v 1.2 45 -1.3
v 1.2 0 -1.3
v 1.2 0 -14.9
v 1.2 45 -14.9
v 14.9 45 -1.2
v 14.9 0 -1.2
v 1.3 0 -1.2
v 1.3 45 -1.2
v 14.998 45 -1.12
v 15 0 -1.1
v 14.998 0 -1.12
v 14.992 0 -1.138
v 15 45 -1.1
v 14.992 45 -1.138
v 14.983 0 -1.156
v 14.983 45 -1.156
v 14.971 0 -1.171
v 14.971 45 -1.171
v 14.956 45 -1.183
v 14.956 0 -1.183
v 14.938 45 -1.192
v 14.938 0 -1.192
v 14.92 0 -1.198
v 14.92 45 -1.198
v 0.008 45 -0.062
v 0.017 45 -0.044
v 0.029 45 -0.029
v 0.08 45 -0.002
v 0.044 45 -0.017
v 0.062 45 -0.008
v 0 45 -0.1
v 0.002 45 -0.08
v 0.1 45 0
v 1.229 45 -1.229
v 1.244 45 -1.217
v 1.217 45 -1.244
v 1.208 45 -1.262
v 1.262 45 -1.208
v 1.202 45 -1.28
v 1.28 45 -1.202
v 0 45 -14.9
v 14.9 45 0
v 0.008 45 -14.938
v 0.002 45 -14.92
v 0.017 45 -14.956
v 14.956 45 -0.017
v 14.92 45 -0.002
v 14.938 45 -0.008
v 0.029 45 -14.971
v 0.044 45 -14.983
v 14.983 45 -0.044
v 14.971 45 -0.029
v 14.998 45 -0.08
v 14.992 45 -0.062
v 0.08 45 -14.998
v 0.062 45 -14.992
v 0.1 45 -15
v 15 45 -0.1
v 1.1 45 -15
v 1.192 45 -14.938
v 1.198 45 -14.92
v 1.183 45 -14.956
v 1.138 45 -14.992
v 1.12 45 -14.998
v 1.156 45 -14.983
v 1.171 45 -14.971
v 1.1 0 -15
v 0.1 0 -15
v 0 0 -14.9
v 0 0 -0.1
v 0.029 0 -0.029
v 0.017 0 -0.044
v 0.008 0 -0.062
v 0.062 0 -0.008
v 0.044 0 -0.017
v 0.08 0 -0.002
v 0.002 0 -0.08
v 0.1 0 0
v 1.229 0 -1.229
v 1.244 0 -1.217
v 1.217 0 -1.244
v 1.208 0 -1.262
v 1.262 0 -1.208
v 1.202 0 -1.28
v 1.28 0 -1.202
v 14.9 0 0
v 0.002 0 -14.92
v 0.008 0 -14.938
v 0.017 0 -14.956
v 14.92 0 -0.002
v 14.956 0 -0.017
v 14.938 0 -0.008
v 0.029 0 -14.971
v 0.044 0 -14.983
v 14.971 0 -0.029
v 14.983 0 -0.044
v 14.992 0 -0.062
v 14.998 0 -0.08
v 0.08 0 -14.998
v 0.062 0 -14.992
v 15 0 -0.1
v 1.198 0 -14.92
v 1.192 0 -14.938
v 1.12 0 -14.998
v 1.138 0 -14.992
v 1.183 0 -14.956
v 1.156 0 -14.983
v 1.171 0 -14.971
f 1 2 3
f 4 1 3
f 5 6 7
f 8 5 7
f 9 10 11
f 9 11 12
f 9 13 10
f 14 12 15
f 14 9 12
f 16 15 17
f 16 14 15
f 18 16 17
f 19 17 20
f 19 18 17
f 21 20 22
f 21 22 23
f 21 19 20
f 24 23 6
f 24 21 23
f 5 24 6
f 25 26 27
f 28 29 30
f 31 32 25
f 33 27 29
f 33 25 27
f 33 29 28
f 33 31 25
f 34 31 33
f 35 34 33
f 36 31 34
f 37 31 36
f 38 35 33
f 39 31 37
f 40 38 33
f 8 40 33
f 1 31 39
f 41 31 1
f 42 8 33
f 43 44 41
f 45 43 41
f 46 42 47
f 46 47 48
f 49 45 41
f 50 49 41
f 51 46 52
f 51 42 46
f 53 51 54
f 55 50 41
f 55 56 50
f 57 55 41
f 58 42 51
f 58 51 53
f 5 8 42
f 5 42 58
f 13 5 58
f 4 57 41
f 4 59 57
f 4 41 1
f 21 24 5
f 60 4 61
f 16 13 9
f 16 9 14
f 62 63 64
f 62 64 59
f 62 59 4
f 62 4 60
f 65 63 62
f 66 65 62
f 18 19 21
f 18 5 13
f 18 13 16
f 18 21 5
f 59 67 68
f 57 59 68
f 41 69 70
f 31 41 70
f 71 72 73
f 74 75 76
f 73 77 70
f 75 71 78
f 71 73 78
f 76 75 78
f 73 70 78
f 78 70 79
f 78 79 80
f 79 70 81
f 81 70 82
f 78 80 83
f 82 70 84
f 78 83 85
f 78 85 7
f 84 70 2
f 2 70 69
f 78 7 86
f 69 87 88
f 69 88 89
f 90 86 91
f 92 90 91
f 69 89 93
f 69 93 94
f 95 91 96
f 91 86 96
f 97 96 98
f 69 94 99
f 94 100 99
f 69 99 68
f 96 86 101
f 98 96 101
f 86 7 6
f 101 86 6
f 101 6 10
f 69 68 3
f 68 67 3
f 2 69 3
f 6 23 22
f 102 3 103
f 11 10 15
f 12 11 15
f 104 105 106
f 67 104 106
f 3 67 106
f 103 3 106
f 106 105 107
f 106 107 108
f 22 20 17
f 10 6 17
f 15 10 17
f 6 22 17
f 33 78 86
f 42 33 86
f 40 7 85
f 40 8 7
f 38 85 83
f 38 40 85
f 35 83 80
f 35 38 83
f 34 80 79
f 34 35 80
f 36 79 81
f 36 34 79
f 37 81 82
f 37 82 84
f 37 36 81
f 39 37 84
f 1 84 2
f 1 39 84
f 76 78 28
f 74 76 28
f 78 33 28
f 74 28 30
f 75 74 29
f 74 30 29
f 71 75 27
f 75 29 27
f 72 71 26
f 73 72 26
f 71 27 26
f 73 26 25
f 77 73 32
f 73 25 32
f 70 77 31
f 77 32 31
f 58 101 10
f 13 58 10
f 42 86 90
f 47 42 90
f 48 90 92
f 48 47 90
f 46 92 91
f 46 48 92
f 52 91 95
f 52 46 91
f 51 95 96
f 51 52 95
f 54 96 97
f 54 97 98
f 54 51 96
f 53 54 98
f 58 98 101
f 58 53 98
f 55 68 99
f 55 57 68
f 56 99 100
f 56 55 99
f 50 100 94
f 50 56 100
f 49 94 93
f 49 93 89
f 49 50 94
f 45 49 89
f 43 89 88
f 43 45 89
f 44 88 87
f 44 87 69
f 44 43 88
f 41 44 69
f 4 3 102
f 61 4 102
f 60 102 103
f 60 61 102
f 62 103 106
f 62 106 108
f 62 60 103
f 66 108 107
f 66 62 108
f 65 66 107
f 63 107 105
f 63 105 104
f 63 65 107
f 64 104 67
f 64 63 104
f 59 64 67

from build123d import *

# Parameters (mm, degrees)
DODANIE_WYCI_GNI_CIE1_DEPTH = 45
ZAOKR_GLENIE2_R             = 0.1


with BuildPart() as part:
    # Szkic1 → Dodanie-wyciągnięcie1 (new body)
    with BuildSketch(Plane(origin=(0, 0, 0), x_dir=(1, 0, 0), z_dir=(0, 1, 0))):
        Polygon((0, 0), (15, 0), (15, 1.2), (1.2, 1.2), (1.2, 15), (0, 15), align=None)
    extrude(amount=DODANIE_WYCI_GNI_CIE1_DEPTH)

    # Zaokrąglenie2
    zaokr_glenie2_edges = [part.edges().sort_by_distance(p)[0] for p in [
        (0, 22.5, -15),
        (1.2, 22.5, -15),
        (1.2, 22.5, -1.2),
        (15, 22.5, -1.2),
        (15, 22.5, 0),
        (0, 22.5, 0),
    ]]
    fillet(zaokr_glenie2_edges, radius=ZAOKR_GLENIE2_R)


solid = part.part
